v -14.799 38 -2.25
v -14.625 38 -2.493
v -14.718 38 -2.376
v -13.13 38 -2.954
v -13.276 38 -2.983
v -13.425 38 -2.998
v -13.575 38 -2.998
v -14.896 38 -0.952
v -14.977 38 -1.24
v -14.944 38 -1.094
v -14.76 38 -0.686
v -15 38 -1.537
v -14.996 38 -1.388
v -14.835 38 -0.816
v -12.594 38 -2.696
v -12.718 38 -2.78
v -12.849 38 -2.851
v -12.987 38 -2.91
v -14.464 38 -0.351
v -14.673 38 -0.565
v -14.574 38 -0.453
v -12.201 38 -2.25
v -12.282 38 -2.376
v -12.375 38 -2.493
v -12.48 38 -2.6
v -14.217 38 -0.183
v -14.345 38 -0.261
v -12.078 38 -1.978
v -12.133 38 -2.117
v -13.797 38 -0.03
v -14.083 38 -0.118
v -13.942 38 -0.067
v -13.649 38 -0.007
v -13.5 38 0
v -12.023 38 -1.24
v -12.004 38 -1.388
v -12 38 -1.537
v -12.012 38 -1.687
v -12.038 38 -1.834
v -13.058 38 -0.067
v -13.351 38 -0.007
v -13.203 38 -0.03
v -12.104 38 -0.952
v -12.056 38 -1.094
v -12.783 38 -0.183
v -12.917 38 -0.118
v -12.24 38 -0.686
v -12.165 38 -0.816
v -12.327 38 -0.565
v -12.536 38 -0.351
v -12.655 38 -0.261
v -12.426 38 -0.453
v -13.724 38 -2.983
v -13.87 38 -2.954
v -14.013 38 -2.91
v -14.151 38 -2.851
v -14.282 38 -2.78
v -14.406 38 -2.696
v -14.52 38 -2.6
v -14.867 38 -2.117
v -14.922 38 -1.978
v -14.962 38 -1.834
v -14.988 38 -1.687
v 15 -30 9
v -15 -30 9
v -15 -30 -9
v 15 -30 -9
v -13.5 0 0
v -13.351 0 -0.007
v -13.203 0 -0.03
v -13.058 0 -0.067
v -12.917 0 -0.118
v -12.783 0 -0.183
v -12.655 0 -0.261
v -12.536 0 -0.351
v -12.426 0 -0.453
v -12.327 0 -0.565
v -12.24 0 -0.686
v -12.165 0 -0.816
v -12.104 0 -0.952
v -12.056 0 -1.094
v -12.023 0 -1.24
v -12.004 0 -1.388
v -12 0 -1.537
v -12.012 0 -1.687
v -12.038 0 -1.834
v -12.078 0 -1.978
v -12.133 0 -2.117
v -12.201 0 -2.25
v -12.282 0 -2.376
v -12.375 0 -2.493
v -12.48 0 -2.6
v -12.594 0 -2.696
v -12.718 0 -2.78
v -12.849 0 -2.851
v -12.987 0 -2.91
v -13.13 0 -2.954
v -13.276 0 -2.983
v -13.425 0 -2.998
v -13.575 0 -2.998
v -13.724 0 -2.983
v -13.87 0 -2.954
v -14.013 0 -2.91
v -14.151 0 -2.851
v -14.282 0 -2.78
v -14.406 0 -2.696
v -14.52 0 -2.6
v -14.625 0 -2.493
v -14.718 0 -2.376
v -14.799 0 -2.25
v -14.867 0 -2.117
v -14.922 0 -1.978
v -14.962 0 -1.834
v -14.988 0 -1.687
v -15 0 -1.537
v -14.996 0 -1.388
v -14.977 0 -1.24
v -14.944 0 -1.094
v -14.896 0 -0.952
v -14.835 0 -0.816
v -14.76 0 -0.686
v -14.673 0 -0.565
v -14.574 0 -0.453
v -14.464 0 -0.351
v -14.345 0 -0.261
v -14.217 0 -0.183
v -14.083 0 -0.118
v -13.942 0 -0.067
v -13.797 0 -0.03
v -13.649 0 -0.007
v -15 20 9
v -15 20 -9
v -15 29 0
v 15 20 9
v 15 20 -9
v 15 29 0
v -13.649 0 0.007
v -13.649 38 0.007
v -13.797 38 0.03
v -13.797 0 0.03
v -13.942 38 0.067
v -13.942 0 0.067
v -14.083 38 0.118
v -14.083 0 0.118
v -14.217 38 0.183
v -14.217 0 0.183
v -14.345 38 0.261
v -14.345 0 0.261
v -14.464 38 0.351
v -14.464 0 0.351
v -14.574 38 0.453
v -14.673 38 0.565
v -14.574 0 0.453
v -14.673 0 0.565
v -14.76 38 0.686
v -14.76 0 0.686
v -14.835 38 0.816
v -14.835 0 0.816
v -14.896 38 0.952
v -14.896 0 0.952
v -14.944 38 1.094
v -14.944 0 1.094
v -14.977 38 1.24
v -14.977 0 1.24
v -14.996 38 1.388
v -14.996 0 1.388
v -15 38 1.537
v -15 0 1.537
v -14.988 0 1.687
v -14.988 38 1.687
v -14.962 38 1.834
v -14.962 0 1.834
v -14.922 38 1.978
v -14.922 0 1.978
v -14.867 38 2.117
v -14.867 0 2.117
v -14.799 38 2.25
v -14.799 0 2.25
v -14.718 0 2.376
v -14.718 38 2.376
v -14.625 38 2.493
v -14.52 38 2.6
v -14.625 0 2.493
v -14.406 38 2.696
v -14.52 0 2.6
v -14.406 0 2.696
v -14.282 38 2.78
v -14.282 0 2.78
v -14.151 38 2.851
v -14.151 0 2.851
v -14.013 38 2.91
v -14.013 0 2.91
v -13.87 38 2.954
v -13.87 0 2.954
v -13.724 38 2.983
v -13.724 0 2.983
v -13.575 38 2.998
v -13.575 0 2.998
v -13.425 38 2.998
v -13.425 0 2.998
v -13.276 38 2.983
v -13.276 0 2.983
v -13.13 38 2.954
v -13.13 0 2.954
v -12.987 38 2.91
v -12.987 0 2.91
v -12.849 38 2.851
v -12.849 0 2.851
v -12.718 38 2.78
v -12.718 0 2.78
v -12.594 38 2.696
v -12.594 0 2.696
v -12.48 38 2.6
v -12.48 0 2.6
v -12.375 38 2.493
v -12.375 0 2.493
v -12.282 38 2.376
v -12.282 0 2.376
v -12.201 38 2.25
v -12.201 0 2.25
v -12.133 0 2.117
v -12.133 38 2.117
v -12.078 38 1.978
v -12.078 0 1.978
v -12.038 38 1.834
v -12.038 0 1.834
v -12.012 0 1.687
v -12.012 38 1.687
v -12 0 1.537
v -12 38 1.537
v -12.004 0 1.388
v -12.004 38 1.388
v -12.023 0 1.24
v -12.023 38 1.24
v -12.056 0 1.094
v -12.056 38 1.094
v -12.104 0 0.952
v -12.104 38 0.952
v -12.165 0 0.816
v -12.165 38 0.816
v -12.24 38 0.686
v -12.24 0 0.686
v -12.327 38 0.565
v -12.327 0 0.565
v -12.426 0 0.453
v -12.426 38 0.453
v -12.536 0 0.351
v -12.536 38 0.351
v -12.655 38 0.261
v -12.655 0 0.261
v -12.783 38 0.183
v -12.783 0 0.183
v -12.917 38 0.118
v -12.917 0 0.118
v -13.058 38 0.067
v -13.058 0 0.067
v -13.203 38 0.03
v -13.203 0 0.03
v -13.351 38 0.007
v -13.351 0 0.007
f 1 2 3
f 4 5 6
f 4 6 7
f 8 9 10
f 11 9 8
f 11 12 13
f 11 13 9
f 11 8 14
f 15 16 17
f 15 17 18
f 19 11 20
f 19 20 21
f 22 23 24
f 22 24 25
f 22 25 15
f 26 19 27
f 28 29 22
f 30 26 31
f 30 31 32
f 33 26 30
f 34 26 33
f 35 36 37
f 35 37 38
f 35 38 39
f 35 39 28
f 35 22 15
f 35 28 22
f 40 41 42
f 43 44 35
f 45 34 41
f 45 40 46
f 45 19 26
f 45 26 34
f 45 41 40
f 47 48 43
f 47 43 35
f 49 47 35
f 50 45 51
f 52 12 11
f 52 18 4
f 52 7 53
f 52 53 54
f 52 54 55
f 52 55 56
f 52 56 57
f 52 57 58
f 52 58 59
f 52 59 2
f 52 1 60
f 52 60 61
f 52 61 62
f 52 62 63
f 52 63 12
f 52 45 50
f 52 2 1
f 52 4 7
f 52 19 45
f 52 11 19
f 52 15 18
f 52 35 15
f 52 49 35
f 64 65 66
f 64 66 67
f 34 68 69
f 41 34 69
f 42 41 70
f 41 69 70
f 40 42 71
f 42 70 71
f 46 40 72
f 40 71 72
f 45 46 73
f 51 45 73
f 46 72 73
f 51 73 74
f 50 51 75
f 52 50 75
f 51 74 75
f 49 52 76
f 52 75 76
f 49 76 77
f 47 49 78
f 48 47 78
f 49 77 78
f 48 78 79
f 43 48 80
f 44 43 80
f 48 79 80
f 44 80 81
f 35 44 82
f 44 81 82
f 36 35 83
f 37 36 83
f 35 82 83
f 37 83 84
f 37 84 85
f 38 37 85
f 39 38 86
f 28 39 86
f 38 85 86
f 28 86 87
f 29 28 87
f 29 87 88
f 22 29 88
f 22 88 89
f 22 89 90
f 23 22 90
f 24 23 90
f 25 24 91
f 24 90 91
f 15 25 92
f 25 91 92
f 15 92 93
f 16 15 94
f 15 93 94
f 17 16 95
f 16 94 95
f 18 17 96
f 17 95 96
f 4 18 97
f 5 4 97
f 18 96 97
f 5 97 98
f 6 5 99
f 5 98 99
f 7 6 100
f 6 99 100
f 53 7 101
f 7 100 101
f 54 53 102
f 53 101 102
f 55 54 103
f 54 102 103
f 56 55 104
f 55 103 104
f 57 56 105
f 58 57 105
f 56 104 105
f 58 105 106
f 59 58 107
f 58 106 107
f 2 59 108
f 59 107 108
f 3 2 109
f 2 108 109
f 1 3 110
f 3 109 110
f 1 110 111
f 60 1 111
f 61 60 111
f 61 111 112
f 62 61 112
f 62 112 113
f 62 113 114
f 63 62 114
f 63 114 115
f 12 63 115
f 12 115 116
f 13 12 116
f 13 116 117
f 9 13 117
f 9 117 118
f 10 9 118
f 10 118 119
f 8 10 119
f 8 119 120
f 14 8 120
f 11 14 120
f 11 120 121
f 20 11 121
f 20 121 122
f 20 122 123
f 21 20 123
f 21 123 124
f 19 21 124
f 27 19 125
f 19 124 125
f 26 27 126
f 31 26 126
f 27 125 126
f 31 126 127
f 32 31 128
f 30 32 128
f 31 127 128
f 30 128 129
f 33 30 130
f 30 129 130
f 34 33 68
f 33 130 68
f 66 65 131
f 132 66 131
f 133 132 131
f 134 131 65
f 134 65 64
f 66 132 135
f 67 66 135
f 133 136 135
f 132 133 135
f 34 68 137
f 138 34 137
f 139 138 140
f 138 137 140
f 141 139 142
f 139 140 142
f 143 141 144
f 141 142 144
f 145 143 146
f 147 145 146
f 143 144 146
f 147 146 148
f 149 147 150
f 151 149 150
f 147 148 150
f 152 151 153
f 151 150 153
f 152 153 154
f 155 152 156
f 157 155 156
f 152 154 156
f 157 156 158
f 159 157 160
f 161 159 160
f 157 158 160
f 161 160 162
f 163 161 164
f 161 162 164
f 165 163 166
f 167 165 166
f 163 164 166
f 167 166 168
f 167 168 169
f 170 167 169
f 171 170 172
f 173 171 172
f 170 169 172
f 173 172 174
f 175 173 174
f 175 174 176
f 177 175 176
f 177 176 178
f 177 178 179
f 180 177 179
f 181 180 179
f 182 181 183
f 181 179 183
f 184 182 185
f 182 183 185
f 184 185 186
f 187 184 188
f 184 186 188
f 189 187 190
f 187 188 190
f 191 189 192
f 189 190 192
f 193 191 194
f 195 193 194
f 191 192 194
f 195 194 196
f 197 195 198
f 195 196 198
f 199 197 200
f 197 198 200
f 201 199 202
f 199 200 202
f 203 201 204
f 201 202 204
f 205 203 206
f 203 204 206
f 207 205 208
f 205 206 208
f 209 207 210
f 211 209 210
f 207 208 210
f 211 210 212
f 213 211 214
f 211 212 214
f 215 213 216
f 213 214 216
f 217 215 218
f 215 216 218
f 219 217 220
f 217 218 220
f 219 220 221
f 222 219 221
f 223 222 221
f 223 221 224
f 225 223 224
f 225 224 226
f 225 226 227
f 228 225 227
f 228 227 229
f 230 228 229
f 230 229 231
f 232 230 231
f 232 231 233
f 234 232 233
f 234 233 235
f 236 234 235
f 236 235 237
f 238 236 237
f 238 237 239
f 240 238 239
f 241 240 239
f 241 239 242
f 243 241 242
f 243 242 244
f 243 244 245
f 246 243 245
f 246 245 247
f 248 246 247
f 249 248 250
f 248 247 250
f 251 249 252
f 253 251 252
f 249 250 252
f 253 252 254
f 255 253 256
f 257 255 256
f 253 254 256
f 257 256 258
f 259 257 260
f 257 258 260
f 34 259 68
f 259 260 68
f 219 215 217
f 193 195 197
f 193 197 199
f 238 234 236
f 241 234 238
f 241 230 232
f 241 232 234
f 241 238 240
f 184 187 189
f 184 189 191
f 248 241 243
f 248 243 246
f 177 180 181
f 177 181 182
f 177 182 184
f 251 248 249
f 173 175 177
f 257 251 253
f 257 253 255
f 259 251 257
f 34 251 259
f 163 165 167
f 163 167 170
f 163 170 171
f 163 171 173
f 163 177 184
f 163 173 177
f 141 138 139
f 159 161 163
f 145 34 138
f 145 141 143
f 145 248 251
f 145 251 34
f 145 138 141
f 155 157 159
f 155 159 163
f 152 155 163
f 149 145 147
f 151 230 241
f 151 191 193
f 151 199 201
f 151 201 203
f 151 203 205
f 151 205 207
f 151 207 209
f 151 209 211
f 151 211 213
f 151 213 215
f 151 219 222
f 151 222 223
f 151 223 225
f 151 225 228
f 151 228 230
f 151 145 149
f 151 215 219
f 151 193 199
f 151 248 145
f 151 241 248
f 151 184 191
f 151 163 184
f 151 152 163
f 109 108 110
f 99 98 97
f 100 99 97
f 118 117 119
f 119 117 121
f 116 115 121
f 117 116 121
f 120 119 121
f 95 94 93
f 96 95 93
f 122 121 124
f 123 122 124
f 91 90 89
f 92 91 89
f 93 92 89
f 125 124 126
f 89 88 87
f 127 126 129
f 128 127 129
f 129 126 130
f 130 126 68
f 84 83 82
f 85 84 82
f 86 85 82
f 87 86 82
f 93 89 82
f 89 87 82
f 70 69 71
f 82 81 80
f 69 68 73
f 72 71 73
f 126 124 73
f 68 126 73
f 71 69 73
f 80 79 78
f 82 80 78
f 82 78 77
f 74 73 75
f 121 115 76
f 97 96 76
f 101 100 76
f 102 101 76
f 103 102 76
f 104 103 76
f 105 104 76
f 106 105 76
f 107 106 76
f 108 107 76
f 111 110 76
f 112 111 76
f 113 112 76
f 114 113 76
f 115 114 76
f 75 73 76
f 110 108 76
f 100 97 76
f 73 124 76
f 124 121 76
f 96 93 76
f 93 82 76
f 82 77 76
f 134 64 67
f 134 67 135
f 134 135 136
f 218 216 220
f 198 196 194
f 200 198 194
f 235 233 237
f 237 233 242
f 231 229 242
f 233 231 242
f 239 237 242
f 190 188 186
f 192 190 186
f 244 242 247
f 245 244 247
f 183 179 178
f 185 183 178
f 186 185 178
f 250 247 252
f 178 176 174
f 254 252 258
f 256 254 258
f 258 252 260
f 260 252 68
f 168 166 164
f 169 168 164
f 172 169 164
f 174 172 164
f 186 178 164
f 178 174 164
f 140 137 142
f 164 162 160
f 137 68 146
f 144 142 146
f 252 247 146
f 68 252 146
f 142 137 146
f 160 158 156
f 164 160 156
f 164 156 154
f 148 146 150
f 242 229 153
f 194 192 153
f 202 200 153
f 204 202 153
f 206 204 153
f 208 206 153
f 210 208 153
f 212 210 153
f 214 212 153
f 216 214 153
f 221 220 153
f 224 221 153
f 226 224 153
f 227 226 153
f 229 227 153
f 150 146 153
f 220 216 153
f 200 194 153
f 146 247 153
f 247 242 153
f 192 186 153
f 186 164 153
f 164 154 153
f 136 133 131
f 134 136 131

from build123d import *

# Parameters (mm, degrees)
CROQUIS1_W                = 30
CROQUIS1_H                = 60
SALIENTE_EXTRUIR1_DEPTH   = 9
CHAFL_N1_SIZE             = 10
CROQUIS2_R                = 1.5
SALIENTE_EXTRUIR4_DEPTH   = 38
SALIENTE_EXTRUIR4_2_DEPTH = 38


with BuildPart() as part:
    # Croquis1 → Saliente-Extruir1 (new, symmetric)
    with BuildSketch(Plane.XY):
        Rectangle(CROQUIS1_W, CROQUIS1_H)
    extrude(amount=SALIENTE_EXTRUIR1_DEPTH, both=True)

    # Chaflán1
    # the kernel refuses this chamfer: 10 mm, written as the material it takes off along each edge
    with BuildSketch(Plane(origin=(40.71682988, 30, -9), x_dir=(0, 0.027495876610586317, 0.9996219169112968), z_dir=(-1, 0, 0))) as chafl_n1_piece_1:
        Polygon((CHAFL_N1_SIZE * 0.999621916911, -CHAFL_N1_SIZE * 0.0274958766106), (-CHAFL_N1_SIZE * 0.0274958766106, -CHAFL_N1_SIZE * 0.999621916911), (0, 0), align=None)
    extrude(amount=81.433659759, mode=Mode.SUBTRACT)
    with BuildSketch(Plane(origin=(40.71682988, 30, 9), x_dir=(0, 0.027495876610586317, -0.9996219169112968), z_dir=(-1, 0, 0))) as chafl_n1_piece_2:
        Polygon((CHAFL_N1_SIZE * 0.999621916911, CHAFL_N1_SIZE * 0.0274958766106), (-CHAFL_N1_SIZE * 0.0274958766106, CHAFL_N1_SIZE * 0.999621916911), (0, 0), align=None)
    extrude(amount=81.433659759, mode=Mode.SUBTRACT)


with BuildPart() as body_2:
    # Croquis2 → Saliente-Extruir4 (new body)
    with BuildSketch(Plane(origin=(0, 0, 0), x_dir=(1, 0, 0), z_dir=(0, 1, 0))):
        with Locations(Location((-13.5, 1.5, 0), (0, 0, 270))):
            Circle(CROQUIS2_R)
    extrude(amount=SALIENTE_EXTRUIR4_DEPTH)


with BuildPart() as body_3:
    # Croquis2 → Saliente-Extruir4 2 (new body)
    with BuildSketch(Plane(origin=(0, 0, 0), x_dir=(1, 0, 0), z_dir=(0, 1, 0))):
        with Locations(Location((-13.5, -1.5, 0), (0, 0, 90))):
            Circle(CROQUIS2_R)
    extrude(amount=SALIENTE_EXTRUIR4_2_DEPTH)


solid = Compound([part.part, body_2.part, body_3.part])
